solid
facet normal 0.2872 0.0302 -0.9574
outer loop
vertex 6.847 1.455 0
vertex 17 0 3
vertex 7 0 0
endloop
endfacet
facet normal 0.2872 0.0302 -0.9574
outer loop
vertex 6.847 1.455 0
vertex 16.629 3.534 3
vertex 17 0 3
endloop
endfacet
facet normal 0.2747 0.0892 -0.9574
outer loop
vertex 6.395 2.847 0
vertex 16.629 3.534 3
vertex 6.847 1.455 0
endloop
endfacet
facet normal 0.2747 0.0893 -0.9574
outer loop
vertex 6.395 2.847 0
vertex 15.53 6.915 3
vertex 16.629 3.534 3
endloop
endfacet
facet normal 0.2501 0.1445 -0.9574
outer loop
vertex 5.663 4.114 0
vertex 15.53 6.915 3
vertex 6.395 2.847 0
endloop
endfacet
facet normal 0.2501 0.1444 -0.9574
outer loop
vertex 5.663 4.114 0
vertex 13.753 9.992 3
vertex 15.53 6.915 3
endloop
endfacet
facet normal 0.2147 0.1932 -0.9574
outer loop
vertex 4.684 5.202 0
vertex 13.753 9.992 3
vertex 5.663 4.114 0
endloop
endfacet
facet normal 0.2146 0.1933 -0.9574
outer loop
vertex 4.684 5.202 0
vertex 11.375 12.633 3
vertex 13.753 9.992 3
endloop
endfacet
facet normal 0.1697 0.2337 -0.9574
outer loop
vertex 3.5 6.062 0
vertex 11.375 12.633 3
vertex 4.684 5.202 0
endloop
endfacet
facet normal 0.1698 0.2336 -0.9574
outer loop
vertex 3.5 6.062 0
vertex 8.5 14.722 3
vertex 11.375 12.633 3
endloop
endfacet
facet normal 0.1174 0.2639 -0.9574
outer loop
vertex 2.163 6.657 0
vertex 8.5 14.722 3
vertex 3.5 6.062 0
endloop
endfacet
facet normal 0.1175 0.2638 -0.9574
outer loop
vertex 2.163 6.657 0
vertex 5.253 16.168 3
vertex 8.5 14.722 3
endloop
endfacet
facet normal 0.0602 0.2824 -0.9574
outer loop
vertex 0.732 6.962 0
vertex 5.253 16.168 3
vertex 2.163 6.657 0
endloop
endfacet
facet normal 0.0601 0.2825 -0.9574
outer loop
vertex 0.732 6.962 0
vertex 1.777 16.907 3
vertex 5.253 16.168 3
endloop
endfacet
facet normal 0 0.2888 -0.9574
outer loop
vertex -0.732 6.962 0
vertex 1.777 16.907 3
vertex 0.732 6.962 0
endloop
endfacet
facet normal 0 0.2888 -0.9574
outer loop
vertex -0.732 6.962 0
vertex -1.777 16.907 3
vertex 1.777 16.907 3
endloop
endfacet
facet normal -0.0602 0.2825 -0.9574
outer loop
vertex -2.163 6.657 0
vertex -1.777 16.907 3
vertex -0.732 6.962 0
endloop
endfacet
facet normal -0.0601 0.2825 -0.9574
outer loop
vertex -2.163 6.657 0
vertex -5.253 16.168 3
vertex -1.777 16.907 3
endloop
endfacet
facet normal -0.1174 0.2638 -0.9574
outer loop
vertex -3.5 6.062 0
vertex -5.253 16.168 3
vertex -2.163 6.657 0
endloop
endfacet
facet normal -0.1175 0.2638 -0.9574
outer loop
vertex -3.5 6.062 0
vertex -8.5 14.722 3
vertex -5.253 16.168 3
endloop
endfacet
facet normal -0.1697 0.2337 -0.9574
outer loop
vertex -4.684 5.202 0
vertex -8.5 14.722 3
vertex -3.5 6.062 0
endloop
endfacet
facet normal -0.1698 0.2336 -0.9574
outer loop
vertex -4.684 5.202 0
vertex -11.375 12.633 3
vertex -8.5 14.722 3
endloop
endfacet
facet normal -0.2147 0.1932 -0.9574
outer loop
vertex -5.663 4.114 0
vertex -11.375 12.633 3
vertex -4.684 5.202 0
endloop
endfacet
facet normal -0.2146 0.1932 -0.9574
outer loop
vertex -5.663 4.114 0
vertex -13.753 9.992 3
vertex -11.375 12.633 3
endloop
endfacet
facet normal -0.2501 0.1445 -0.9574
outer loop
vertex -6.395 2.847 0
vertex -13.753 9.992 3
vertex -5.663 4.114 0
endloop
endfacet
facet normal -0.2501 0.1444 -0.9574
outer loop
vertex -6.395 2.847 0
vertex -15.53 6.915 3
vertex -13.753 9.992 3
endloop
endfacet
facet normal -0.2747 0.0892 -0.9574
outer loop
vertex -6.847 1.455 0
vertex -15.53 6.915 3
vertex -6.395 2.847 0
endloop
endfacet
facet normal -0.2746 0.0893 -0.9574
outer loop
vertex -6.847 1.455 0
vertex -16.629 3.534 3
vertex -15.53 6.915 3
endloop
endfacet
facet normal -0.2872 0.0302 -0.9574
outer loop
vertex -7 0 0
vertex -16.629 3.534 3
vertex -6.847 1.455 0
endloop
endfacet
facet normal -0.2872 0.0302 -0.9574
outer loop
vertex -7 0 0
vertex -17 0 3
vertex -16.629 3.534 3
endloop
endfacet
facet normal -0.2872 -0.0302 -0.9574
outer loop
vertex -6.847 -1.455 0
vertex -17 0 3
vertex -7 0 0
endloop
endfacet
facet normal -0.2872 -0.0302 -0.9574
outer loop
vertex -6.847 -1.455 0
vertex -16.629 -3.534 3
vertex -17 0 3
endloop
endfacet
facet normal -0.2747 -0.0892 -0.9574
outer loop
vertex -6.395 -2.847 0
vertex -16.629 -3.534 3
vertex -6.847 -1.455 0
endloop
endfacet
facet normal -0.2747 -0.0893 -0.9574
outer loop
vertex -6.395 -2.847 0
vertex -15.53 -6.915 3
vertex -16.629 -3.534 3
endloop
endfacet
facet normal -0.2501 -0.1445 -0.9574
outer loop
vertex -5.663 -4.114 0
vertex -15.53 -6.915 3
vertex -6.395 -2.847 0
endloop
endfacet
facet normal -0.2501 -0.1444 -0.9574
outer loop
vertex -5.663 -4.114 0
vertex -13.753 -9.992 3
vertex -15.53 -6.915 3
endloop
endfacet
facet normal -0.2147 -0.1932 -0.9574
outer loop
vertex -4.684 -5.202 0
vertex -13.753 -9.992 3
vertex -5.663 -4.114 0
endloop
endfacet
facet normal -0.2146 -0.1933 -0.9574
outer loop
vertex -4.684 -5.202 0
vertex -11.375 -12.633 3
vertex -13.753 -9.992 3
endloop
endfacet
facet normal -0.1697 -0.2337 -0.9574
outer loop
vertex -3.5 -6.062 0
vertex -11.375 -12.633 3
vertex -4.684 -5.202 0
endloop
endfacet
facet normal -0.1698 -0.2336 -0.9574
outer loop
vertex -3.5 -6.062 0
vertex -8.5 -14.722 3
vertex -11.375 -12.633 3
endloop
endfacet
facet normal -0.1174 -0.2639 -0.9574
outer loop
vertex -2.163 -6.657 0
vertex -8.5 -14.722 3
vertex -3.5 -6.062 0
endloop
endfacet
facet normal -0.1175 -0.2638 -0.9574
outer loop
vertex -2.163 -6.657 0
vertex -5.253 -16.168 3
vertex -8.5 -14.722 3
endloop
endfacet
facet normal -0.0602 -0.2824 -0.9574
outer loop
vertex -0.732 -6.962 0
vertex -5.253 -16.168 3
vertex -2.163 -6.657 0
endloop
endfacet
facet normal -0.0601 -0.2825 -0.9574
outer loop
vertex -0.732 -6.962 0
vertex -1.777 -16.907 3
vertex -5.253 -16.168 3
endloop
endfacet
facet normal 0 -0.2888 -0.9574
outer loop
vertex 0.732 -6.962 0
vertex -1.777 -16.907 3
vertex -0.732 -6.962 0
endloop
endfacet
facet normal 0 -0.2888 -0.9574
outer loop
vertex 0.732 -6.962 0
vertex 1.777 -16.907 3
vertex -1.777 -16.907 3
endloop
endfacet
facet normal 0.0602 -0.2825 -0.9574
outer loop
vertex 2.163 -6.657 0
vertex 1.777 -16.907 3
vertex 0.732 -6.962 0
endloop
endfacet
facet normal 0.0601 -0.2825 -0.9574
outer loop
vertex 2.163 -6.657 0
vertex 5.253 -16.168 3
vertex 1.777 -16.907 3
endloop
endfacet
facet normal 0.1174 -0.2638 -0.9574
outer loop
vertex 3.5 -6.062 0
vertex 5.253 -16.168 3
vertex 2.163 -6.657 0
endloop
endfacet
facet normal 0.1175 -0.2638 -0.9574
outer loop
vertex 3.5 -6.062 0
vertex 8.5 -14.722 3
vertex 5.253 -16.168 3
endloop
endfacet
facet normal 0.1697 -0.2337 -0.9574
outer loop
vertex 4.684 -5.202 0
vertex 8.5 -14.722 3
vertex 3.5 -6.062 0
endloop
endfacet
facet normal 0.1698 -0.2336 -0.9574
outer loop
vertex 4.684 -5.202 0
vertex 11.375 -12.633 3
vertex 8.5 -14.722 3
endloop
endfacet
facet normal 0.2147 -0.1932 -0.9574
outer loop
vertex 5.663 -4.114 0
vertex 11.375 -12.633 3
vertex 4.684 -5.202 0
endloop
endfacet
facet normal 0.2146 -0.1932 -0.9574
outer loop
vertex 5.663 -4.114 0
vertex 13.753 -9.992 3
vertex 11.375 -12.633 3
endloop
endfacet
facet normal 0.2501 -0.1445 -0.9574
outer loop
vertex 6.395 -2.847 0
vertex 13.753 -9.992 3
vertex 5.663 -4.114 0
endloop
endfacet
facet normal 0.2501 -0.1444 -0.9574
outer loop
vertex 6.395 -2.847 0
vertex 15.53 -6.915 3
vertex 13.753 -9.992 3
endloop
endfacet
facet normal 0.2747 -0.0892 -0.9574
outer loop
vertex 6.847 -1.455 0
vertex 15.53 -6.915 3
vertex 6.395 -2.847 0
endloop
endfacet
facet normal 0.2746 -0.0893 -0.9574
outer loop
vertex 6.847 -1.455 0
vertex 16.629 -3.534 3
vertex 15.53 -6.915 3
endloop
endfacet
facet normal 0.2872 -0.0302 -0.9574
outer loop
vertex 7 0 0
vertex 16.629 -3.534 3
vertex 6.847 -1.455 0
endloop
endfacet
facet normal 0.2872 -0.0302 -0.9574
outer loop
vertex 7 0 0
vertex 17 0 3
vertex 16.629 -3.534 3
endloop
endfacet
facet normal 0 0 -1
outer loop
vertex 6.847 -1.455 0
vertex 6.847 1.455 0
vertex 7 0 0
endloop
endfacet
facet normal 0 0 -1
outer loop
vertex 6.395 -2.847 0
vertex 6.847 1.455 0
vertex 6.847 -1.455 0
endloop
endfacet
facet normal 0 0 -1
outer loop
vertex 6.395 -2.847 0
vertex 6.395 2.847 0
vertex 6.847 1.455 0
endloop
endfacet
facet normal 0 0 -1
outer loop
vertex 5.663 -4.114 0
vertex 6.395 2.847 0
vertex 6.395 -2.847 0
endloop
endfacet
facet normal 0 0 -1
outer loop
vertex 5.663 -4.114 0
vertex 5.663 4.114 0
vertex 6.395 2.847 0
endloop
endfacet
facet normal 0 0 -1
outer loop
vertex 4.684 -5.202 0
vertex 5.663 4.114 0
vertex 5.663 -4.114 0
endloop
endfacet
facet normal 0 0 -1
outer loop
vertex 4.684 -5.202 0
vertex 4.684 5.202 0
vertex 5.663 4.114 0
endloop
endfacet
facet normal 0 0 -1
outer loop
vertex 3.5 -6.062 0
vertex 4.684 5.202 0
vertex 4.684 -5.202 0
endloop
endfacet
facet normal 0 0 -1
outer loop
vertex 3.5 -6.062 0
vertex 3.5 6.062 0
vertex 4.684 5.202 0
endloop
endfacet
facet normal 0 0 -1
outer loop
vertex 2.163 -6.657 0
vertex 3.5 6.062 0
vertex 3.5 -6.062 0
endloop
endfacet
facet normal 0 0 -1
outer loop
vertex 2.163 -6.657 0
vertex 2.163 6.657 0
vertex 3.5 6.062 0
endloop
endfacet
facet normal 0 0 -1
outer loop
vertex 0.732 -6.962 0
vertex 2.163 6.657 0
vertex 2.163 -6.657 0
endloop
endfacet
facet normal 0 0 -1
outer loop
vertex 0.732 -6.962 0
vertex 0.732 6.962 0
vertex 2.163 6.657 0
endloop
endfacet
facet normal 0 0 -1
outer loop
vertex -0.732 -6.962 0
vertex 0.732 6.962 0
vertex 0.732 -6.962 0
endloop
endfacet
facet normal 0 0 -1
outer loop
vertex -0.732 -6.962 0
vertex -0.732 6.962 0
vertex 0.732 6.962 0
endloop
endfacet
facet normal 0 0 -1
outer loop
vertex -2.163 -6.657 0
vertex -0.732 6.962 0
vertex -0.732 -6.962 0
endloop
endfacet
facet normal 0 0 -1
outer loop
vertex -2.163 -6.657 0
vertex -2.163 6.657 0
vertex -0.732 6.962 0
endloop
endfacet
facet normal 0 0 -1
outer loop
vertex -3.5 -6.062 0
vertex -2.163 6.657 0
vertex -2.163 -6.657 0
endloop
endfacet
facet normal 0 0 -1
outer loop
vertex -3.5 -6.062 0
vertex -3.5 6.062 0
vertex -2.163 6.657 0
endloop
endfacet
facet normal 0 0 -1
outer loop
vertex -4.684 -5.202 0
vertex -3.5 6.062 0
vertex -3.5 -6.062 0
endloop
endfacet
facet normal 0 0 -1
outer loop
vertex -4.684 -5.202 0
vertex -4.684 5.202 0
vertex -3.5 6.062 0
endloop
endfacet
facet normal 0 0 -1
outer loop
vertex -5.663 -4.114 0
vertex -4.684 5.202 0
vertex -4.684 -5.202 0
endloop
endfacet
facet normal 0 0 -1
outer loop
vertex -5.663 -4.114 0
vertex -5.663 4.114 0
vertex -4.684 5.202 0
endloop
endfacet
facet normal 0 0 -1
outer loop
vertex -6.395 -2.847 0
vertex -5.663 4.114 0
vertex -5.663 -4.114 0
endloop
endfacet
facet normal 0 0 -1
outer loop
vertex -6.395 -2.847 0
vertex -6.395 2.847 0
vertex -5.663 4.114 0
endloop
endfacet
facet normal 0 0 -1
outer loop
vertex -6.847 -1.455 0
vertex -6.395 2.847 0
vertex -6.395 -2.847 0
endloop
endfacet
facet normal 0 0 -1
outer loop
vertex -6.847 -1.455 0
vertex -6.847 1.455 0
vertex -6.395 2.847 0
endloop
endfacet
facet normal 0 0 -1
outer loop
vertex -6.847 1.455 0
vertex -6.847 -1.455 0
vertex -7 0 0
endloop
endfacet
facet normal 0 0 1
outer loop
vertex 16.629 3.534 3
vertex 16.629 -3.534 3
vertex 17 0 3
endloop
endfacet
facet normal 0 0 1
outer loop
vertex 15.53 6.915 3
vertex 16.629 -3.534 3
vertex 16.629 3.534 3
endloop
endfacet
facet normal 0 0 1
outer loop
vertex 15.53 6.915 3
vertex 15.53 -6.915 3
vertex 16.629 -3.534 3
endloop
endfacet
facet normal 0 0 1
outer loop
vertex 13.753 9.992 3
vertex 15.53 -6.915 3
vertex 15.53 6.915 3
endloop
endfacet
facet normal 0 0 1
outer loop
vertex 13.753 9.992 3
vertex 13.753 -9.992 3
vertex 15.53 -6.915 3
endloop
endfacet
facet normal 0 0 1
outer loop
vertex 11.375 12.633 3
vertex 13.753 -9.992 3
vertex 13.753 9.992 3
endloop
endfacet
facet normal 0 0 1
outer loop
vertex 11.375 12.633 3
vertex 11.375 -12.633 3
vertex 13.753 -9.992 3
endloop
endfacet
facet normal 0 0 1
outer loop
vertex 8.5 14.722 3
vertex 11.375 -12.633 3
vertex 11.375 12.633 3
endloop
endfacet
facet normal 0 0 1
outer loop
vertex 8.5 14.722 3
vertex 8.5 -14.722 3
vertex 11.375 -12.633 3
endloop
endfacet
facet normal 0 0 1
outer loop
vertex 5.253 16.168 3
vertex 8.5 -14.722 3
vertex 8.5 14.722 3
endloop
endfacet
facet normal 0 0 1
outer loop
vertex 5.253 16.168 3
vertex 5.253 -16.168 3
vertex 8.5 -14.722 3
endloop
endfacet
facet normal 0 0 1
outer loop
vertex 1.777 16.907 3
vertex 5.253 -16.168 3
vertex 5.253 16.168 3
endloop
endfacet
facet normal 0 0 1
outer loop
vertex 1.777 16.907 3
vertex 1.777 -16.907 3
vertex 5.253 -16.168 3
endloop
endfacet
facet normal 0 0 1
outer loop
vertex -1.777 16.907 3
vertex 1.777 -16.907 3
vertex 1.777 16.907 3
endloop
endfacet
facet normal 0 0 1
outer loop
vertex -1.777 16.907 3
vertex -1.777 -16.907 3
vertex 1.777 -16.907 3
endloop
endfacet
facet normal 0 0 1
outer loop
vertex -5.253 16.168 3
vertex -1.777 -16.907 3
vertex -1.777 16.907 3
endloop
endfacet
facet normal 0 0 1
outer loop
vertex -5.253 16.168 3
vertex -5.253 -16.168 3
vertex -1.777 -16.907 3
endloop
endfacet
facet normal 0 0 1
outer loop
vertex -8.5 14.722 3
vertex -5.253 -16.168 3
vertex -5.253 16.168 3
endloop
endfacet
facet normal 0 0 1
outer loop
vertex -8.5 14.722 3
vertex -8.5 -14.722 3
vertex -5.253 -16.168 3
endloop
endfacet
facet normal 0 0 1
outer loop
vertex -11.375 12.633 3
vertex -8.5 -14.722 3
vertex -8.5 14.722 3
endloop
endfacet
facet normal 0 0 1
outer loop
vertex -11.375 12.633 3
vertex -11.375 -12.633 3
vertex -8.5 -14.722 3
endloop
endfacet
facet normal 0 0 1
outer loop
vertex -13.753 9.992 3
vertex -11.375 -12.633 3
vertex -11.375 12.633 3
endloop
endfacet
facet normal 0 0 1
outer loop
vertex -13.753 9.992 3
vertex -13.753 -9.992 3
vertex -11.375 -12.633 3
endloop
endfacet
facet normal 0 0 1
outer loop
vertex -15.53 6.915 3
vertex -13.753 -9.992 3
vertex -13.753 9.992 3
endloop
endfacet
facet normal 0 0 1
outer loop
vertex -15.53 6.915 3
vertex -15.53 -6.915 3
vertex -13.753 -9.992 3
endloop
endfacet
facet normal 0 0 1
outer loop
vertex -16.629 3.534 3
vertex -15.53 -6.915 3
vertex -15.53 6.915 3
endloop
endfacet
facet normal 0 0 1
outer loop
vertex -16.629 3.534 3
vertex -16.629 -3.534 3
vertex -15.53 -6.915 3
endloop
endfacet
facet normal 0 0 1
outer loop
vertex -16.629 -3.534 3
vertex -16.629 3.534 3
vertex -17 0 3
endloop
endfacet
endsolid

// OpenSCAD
// Generated by SolidPython 1.0.1 on 2020-07-29 00:02:42


cylinder(h = 3, r1 = 7, r2 = 17);
/***********************************************
*********      SolidPython code:      **********
************************************************
 
# import packages: SolidPython
from solid import *
from solid.utils import *
from itertools import chain, combinations


class Resize:

    def __init__(self, scad_file):
        self.scad_file = scad_file
        #self.scad_file = import_scad(scad_file)
        # cone/cylinder param:
        self.r1 = 0
        self.r2 = 0
        self.h = 0
        # rectangular prism param:
        self.w = 0
        self.l = 0
        # ellipse param:
        self.r = 0

    # import OpenScad code (file name corresponds to shape)


    # classify shape + parameters
    def assign(self, param1, param2, param3):
        if self.scad_file == 'cone.scad':
            self.r1 = param1
            self.r2 = param2
            self.h = param3
        elif self.scad_file == 'cylinder.scad':
            self.r1 = param1
            self.r2 = param2
            self.h = param3
        elif self.scad_file == 'rectangularPrism.scad':
            self.h = param1
            self.l = param2
            self.w = param3
        else:
            self.r = param1
            self.h = param2

    # resize parameters
    def iterate(self):
        x = range(3, 20, 2)
        i = 1
        if self.scad_file == 'cone.scad':
            tempList = list(combinations(x, 3))
            #print(tempList)
            for i in x:
                for j in range (3):
                    param1 = tempList[i][0]
                    param2 = tempList[i][1]
                    param3 = tempList[i][2]
                    filepath = 'produced_scad_files/' + 'cone' + str(param1) + '_' + str(param2) + '_' + str(param3) + '.scad'
                    scad_render_to_file(cylinder(h=param1, r1=param2, r2=param3), filepath)

        elif self.scad_file == 'cylinder.scad':
            tempList = list(combinations(x, 3))
            for i in x:
                for j in range(3):
                    param1 = tempList[i][0]
                    param2 = tempList[i][1]
                    param3 = tempList[i][2]
                    filepath = 'produced_scad_files/' + 'cylinder' + str(param1) + '_' + str(param2) + '_' + str(param3) + '.scad'
                    scad_render_to_file(cylinder(h=param1, r1=param2, r2=param3), filepath)

        elif self.scad_file == 'rectangularPrism.scad':
            tempList = list(combinations(x, 3))
            for i in x:
                for j in range(3):
                    param1 = tempList[i][0]
                    param2 = tempList[i][1]
                    param3 = tempList[i][2]
                    filepath = 'produced_scad_files/' + 'rectangularPrism' + str(param1) + '_' + str(param2) + '_' + str(
                        param3) + '.scad'
                    scad_render_to_file(cube(size=(param1, param2, param3)), filepath)

        else:
            tempList = list(combinations(x, 2))
            for i in x:
                for j in range(3):
                    param1 = tempList[i][0]
                    param2 = tempList[i][1]
                    filepath = 'produced_scad_files/' + 'ellipse' + str(param1) + '_' + str(param2) + '_' + '.scad'
                    scad_render_to_file(sphere(param1, param2), filepath)

    def render_to_scadfile(self):
        scad_render_to_file(scad, 'example.scad') 
 
************************************************/
